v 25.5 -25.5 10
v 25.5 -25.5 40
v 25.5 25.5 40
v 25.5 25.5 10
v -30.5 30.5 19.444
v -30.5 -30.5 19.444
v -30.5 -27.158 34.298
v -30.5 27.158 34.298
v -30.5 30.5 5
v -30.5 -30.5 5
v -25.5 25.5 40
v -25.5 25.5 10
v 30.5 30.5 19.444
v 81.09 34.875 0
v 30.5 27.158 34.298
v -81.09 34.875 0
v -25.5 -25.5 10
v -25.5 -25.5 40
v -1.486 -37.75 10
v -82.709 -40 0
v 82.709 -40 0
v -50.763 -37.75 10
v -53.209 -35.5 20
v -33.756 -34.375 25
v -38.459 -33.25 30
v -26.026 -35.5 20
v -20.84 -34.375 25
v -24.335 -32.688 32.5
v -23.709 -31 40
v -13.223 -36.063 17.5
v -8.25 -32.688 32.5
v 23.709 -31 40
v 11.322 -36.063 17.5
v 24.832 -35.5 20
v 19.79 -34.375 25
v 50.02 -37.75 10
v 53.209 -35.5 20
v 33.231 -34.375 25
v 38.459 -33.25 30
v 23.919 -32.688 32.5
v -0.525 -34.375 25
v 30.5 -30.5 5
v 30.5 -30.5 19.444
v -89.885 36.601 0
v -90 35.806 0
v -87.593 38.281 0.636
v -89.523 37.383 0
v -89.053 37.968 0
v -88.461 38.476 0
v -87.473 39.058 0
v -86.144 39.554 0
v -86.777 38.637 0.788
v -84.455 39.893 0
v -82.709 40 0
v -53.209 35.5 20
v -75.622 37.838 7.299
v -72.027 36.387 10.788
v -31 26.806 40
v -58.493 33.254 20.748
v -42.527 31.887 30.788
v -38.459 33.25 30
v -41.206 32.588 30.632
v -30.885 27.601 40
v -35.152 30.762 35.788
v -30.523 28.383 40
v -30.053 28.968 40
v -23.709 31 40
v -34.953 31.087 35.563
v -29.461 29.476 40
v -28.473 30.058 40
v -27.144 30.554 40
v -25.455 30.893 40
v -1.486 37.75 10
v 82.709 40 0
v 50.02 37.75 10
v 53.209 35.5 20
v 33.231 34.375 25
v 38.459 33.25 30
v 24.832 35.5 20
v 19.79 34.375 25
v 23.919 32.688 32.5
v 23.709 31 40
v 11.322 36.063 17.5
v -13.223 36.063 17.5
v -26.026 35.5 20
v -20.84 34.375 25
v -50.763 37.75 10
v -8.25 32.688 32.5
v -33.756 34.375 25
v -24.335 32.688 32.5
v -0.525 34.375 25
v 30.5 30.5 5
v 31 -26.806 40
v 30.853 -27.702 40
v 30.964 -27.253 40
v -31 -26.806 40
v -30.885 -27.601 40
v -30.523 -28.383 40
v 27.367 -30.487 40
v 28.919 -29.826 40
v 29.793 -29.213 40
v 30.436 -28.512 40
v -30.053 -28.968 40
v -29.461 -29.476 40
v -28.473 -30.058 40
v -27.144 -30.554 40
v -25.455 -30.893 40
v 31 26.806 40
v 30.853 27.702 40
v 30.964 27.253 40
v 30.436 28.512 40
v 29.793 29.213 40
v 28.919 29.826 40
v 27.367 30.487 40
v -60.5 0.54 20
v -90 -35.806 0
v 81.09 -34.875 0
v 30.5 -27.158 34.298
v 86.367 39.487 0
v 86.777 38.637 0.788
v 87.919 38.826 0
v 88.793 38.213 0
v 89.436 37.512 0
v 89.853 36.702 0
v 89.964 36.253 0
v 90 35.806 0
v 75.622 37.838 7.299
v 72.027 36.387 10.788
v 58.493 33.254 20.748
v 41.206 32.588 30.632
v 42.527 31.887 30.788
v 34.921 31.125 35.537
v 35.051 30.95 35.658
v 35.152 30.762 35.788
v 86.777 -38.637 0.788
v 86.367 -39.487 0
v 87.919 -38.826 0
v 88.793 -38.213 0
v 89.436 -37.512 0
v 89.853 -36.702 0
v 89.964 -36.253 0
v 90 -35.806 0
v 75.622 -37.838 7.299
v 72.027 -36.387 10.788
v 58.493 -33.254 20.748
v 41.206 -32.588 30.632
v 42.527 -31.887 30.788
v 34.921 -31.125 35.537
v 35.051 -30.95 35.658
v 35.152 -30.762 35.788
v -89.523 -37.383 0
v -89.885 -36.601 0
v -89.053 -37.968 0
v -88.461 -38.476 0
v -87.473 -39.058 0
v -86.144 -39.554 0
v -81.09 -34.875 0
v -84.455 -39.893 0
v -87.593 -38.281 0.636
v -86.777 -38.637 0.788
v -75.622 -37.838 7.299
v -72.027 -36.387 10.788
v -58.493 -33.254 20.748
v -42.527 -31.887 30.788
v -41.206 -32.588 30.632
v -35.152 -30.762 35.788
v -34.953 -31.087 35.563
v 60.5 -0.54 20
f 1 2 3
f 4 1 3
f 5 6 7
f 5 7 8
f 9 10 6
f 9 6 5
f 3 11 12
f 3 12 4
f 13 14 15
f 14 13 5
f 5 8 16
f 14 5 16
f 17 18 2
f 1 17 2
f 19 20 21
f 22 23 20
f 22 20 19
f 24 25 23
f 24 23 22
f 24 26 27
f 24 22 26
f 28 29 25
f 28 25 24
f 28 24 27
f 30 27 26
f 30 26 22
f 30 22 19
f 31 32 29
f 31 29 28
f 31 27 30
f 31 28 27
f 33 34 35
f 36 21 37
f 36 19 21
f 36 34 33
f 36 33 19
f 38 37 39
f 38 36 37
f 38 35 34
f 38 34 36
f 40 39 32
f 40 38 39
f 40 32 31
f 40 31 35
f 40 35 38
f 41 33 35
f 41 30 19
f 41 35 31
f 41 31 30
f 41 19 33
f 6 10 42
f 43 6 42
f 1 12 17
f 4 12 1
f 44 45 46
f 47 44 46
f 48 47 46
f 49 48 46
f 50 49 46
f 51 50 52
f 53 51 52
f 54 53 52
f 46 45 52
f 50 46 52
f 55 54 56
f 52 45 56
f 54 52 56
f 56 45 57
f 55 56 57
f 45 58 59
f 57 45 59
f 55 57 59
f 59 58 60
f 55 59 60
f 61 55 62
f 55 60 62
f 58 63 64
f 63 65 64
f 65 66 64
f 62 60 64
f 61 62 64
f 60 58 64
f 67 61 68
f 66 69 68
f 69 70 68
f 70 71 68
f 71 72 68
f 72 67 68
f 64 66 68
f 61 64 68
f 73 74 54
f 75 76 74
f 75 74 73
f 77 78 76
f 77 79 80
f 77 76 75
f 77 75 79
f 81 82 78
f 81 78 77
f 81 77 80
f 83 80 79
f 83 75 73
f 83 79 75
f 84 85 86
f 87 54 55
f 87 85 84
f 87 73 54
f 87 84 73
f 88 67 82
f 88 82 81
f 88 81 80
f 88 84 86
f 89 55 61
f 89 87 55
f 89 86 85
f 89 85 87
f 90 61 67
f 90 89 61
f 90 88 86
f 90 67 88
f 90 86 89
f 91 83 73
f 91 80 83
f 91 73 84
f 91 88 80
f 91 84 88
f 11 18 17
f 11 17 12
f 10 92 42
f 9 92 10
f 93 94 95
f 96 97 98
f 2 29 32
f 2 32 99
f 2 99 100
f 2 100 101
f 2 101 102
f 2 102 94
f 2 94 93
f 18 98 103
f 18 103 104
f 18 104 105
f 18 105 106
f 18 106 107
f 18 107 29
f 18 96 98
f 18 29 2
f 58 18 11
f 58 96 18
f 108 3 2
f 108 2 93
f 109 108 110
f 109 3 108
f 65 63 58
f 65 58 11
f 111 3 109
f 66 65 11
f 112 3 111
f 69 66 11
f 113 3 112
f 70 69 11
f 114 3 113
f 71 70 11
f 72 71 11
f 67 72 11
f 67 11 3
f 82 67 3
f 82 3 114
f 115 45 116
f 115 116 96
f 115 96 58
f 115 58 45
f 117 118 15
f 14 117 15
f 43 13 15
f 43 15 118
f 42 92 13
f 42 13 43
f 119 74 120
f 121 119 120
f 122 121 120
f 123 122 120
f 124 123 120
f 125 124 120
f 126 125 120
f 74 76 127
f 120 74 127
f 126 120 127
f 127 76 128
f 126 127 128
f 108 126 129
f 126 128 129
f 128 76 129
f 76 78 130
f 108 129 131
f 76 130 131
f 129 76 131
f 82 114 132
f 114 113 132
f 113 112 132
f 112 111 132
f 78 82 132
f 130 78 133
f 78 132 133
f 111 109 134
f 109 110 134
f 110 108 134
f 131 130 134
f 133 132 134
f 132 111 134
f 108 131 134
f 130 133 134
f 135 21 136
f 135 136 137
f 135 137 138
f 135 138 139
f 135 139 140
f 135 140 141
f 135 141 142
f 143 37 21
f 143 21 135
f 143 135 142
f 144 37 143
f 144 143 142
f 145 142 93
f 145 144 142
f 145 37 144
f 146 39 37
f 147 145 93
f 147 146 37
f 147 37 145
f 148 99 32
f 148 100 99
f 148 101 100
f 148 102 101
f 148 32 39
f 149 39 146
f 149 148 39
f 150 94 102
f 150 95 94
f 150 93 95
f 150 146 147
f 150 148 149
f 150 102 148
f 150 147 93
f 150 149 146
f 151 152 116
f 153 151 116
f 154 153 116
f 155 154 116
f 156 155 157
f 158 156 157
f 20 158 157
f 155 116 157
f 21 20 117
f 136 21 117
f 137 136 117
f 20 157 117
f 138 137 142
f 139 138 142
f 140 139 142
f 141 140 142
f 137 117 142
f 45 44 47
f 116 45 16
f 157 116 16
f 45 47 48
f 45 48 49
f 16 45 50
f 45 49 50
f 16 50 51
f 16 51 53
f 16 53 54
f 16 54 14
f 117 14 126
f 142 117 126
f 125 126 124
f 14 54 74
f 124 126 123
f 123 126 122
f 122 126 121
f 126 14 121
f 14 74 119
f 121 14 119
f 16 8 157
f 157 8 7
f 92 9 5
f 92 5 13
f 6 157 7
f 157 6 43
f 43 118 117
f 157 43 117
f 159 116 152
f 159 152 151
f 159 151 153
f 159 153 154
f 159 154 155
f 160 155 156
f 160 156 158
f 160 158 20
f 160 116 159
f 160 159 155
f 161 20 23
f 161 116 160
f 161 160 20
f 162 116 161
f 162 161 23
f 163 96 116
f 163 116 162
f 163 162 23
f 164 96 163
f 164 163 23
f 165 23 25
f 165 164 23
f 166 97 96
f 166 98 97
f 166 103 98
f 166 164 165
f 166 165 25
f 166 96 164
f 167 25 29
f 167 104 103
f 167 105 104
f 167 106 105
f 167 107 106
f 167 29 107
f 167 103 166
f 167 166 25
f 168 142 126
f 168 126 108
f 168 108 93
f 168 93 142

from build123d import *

# Parameters (mm, degrees)
F0_W        = 180
F0_H        = 80
F2_W        = 62
F2_H        = 62
F4_W        = 51
F4_H        = 51
F5_DEPTH    = 30
F6_T        = 5
F6_T3_DEPTH = 40
F6_T5_DEPTH = 61
F6_T7_DEPTH = 61
F7_R        = 5


# Not quite as in the source:
# - a shell that OpenCascade refuses in one call is made with other operations: the cavity is built on its own and cut out


with BuildPart() as f3:
    # F0 (on Top) → F3 section 0
    with BuildSketch(Plane.XY):
        Rectangle(F0_W, F0_H)
    # F2 (on offset) → F3 section 1
    with BuildSketch(Plane.XY.offset(40)):
        Rectangle(F2_W, F2_H)
    loft()

    # F4 (on face) → F5 (cut)
    with BuildSketch(Plane.XY.offset(40)):
        Rectangle(F4_W, F4_H)
    extrude(amount=-F5_DEPTH, mode=Mode.SUBTRACT)

    # F6: shell of thickness 5, made by hand


with BuildPart() as f6_core1:
    # F6_t2: copy of F3
    add(f3.part)

    # the walls: a layer under each face that stays
    f6_faces = [f6_core1.faces().sort_by_distance(p)[0] for p in [
        (0, 35.5, 20),
        (-60.5, 0, 20),
        (26.5714285714, 26.5714285714, 40),
        (60.5, 0, 20),
        (0, -35.5, 20),
        (-25.5, 0, 25),
        (0, 25.5, 25),
        (25.5, 0, 25),
        (0, -25.5, 25),
        (0, 0, 10),
    ]]
    thicken(f6_faces, amount=-F6_T, mode=Mode.SUBTRACT)

    # F6_s4 → F6_t3 (cut)
    with BuildSketch(Plane.XY.offset(5)):
        Polygon((-25.45, 25.45), (-30.5, 25.5), (-30.5, 30.5), (-25.5, 30.5), align=None)
        Polygon((-25.45, -25.45), (-30.5, -25.5), (-30.5, -30.5), (-25.5, -30.5), align=None)
        Polygon((25.45, 25.45), (25.5, 30.5), (30.5, 30.5), (30.5, 25.5), align=None)
        Polygon((25.45, -25.45), (30.5, -25.5), (30.5, -30.5), (25.5, -30.5), align=None)
    extrude(amount=F6_T3_DEPTH, mode=Mode.SUBTRACT)

    # F6_s6 → F6_t5 (cut)
    with BuildSketch(Plane.XZ.offset(-30.5)):
        Polygon((-25.45, 10.05), (-30.5, 10), (-30.5, 5), (-25.5, 5), align=None)
        Polygon((25.45, 10.05), (30.5, 10), (30.5, 5), (25.5, 5), align=None)
    extrude(amount=F6_T5_DEPTH, mode=Mode.SUBTRACT)

    # F6_s8 → F6_t7 (cut)
    with BuildSketch(Plane.YZ.offset(-30.5)):
        Polygon((25.45, 10.05), (30.5, 10), (30.5, 5), (25.5, 5), align=None)
        Polygon((-25.45, 10.05), (-30.5, 10), (-30.5, 5), (-25.5, 5), align=None)
    extrude(amount=F6_T7_DEPTH, mode=Mode.SUBTRACT)


with BuildPart() as f3_1:
    add(f3.part)

    # what is left inside the walls is the cavity
    f6_cavity = [f6_core1.part.solids().sort_by_distance(p)[0] for p in [
        (8.772982, -19.739209, 0.05),
    ]]
    add(f6_cavity, mode=Mode.SUBTRACT)

    # F7
    f7_edges = [f3_1.edges().sort_by_distance(p)[0] for p in [
        (60.5, -35.5, 20),
        (60.5, 35.5, 20),
        (-60.5, 35.5, 20),
        (-60.5, -35.5, 20),
    ]]
    fillet(f7_edges, radius=F7_R)


solid = f3_1.part
